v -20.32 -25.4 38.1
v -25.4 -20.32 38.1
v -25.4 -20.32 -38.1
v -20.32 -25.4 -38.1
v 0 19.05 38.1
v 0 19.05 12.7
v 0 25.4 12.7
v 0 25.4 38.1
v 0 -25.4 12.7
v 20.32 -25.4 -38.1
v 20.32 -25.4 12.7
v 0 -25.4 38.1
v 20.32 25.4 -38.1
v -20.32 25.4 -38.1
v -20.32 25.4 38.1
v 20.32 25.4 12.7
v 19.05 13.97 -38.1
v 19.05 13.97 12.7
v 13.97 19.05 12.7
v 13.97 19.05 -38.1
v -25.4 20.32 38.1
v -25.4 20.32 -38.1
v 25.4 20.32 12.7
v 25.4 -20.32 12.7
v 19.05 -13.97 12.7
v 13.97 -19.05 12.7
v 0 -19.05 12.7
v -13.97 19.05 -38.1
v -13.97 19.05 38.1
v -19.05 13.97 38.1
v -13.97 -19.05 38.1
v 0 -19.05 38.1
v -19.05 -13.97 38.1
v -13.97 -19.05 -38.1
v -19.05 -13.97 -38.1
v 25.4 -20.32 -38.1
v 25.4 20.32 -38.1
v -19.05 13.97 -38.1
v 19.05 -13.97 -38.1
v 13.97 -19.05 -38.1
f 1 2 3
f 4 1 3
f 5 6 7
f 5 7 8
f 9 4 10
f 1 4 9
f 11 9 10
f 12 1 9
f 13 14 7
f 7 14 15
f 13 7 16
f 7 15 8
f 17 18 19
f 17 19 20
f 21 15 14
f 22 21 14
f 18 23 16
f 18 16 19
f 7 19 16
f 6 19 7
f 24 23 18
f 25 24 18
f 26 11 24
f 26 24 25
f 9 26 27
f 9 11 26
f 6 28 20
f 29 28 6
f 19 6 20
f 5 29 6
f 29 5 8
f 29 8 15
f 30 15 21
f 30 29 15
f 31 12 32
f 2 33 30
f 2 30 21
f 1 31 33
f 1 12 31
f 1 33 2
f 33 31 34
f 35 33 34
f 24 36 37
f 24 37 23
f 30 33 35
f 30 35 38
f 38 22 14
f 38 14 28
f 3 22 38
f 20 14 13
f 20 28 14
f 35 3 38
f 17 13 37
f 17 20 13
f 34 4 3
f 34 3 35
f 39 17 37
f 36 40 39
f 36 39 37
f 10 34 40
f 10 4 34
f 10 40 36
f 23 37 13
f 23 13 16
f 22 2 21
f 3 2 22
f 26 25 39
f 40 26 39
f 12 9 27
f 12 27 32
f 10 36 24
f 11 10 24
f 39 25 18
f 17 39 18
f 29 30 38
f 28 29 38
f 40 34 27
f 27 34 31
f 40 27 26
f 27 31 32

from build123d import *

# Parameters (mm, degrees)
F1_DEPTH = 25.4
F2_W     = 38.1
F2_H     = 38.1
F3_DEPTH = 76.2
F4_SIZE  = 5.08


with BuildPart() as f1:
    # F0 (on Front) → F1 (new body, symmetric)
    with BuildSketch(Plane.XZ):
        Polygon((0, 38.1), (-25.4, 38.1), (-25.4, -38.1), (25.4, -38.1), (25.4, 12.7), (0, 12.7), align=None)
    extrude(amount=F1_DEPTH, both=True)

    # F2 (on face) → F3 (cut, through all)
    with BuildSketch(Plane.XY.offset(38.1)):
        Rectangle(F2_W, F2_H)
    extrude(amount=-F3_DEPTH, mode=Mode.SUBTRACT)

    # F4
    f4_edges = [f1.edges().sort_by_distance(p)[0] for p in [
        (-19.05, -19.05, 0),
        (19.05, -19.05, -12.7),
        (19.05, 19.05, -12.7),
        (-19.05, 19.05, 0),
        (25.4, -25.4, -12.7),
        (25.4, 25.4, -12.7),
        (-25.4, 25.4, 0),
        (-25.4, -25.4, 0),
    ]]
    chamfer(f4_edges, length=F4_SIZE)


solid = f1.part
